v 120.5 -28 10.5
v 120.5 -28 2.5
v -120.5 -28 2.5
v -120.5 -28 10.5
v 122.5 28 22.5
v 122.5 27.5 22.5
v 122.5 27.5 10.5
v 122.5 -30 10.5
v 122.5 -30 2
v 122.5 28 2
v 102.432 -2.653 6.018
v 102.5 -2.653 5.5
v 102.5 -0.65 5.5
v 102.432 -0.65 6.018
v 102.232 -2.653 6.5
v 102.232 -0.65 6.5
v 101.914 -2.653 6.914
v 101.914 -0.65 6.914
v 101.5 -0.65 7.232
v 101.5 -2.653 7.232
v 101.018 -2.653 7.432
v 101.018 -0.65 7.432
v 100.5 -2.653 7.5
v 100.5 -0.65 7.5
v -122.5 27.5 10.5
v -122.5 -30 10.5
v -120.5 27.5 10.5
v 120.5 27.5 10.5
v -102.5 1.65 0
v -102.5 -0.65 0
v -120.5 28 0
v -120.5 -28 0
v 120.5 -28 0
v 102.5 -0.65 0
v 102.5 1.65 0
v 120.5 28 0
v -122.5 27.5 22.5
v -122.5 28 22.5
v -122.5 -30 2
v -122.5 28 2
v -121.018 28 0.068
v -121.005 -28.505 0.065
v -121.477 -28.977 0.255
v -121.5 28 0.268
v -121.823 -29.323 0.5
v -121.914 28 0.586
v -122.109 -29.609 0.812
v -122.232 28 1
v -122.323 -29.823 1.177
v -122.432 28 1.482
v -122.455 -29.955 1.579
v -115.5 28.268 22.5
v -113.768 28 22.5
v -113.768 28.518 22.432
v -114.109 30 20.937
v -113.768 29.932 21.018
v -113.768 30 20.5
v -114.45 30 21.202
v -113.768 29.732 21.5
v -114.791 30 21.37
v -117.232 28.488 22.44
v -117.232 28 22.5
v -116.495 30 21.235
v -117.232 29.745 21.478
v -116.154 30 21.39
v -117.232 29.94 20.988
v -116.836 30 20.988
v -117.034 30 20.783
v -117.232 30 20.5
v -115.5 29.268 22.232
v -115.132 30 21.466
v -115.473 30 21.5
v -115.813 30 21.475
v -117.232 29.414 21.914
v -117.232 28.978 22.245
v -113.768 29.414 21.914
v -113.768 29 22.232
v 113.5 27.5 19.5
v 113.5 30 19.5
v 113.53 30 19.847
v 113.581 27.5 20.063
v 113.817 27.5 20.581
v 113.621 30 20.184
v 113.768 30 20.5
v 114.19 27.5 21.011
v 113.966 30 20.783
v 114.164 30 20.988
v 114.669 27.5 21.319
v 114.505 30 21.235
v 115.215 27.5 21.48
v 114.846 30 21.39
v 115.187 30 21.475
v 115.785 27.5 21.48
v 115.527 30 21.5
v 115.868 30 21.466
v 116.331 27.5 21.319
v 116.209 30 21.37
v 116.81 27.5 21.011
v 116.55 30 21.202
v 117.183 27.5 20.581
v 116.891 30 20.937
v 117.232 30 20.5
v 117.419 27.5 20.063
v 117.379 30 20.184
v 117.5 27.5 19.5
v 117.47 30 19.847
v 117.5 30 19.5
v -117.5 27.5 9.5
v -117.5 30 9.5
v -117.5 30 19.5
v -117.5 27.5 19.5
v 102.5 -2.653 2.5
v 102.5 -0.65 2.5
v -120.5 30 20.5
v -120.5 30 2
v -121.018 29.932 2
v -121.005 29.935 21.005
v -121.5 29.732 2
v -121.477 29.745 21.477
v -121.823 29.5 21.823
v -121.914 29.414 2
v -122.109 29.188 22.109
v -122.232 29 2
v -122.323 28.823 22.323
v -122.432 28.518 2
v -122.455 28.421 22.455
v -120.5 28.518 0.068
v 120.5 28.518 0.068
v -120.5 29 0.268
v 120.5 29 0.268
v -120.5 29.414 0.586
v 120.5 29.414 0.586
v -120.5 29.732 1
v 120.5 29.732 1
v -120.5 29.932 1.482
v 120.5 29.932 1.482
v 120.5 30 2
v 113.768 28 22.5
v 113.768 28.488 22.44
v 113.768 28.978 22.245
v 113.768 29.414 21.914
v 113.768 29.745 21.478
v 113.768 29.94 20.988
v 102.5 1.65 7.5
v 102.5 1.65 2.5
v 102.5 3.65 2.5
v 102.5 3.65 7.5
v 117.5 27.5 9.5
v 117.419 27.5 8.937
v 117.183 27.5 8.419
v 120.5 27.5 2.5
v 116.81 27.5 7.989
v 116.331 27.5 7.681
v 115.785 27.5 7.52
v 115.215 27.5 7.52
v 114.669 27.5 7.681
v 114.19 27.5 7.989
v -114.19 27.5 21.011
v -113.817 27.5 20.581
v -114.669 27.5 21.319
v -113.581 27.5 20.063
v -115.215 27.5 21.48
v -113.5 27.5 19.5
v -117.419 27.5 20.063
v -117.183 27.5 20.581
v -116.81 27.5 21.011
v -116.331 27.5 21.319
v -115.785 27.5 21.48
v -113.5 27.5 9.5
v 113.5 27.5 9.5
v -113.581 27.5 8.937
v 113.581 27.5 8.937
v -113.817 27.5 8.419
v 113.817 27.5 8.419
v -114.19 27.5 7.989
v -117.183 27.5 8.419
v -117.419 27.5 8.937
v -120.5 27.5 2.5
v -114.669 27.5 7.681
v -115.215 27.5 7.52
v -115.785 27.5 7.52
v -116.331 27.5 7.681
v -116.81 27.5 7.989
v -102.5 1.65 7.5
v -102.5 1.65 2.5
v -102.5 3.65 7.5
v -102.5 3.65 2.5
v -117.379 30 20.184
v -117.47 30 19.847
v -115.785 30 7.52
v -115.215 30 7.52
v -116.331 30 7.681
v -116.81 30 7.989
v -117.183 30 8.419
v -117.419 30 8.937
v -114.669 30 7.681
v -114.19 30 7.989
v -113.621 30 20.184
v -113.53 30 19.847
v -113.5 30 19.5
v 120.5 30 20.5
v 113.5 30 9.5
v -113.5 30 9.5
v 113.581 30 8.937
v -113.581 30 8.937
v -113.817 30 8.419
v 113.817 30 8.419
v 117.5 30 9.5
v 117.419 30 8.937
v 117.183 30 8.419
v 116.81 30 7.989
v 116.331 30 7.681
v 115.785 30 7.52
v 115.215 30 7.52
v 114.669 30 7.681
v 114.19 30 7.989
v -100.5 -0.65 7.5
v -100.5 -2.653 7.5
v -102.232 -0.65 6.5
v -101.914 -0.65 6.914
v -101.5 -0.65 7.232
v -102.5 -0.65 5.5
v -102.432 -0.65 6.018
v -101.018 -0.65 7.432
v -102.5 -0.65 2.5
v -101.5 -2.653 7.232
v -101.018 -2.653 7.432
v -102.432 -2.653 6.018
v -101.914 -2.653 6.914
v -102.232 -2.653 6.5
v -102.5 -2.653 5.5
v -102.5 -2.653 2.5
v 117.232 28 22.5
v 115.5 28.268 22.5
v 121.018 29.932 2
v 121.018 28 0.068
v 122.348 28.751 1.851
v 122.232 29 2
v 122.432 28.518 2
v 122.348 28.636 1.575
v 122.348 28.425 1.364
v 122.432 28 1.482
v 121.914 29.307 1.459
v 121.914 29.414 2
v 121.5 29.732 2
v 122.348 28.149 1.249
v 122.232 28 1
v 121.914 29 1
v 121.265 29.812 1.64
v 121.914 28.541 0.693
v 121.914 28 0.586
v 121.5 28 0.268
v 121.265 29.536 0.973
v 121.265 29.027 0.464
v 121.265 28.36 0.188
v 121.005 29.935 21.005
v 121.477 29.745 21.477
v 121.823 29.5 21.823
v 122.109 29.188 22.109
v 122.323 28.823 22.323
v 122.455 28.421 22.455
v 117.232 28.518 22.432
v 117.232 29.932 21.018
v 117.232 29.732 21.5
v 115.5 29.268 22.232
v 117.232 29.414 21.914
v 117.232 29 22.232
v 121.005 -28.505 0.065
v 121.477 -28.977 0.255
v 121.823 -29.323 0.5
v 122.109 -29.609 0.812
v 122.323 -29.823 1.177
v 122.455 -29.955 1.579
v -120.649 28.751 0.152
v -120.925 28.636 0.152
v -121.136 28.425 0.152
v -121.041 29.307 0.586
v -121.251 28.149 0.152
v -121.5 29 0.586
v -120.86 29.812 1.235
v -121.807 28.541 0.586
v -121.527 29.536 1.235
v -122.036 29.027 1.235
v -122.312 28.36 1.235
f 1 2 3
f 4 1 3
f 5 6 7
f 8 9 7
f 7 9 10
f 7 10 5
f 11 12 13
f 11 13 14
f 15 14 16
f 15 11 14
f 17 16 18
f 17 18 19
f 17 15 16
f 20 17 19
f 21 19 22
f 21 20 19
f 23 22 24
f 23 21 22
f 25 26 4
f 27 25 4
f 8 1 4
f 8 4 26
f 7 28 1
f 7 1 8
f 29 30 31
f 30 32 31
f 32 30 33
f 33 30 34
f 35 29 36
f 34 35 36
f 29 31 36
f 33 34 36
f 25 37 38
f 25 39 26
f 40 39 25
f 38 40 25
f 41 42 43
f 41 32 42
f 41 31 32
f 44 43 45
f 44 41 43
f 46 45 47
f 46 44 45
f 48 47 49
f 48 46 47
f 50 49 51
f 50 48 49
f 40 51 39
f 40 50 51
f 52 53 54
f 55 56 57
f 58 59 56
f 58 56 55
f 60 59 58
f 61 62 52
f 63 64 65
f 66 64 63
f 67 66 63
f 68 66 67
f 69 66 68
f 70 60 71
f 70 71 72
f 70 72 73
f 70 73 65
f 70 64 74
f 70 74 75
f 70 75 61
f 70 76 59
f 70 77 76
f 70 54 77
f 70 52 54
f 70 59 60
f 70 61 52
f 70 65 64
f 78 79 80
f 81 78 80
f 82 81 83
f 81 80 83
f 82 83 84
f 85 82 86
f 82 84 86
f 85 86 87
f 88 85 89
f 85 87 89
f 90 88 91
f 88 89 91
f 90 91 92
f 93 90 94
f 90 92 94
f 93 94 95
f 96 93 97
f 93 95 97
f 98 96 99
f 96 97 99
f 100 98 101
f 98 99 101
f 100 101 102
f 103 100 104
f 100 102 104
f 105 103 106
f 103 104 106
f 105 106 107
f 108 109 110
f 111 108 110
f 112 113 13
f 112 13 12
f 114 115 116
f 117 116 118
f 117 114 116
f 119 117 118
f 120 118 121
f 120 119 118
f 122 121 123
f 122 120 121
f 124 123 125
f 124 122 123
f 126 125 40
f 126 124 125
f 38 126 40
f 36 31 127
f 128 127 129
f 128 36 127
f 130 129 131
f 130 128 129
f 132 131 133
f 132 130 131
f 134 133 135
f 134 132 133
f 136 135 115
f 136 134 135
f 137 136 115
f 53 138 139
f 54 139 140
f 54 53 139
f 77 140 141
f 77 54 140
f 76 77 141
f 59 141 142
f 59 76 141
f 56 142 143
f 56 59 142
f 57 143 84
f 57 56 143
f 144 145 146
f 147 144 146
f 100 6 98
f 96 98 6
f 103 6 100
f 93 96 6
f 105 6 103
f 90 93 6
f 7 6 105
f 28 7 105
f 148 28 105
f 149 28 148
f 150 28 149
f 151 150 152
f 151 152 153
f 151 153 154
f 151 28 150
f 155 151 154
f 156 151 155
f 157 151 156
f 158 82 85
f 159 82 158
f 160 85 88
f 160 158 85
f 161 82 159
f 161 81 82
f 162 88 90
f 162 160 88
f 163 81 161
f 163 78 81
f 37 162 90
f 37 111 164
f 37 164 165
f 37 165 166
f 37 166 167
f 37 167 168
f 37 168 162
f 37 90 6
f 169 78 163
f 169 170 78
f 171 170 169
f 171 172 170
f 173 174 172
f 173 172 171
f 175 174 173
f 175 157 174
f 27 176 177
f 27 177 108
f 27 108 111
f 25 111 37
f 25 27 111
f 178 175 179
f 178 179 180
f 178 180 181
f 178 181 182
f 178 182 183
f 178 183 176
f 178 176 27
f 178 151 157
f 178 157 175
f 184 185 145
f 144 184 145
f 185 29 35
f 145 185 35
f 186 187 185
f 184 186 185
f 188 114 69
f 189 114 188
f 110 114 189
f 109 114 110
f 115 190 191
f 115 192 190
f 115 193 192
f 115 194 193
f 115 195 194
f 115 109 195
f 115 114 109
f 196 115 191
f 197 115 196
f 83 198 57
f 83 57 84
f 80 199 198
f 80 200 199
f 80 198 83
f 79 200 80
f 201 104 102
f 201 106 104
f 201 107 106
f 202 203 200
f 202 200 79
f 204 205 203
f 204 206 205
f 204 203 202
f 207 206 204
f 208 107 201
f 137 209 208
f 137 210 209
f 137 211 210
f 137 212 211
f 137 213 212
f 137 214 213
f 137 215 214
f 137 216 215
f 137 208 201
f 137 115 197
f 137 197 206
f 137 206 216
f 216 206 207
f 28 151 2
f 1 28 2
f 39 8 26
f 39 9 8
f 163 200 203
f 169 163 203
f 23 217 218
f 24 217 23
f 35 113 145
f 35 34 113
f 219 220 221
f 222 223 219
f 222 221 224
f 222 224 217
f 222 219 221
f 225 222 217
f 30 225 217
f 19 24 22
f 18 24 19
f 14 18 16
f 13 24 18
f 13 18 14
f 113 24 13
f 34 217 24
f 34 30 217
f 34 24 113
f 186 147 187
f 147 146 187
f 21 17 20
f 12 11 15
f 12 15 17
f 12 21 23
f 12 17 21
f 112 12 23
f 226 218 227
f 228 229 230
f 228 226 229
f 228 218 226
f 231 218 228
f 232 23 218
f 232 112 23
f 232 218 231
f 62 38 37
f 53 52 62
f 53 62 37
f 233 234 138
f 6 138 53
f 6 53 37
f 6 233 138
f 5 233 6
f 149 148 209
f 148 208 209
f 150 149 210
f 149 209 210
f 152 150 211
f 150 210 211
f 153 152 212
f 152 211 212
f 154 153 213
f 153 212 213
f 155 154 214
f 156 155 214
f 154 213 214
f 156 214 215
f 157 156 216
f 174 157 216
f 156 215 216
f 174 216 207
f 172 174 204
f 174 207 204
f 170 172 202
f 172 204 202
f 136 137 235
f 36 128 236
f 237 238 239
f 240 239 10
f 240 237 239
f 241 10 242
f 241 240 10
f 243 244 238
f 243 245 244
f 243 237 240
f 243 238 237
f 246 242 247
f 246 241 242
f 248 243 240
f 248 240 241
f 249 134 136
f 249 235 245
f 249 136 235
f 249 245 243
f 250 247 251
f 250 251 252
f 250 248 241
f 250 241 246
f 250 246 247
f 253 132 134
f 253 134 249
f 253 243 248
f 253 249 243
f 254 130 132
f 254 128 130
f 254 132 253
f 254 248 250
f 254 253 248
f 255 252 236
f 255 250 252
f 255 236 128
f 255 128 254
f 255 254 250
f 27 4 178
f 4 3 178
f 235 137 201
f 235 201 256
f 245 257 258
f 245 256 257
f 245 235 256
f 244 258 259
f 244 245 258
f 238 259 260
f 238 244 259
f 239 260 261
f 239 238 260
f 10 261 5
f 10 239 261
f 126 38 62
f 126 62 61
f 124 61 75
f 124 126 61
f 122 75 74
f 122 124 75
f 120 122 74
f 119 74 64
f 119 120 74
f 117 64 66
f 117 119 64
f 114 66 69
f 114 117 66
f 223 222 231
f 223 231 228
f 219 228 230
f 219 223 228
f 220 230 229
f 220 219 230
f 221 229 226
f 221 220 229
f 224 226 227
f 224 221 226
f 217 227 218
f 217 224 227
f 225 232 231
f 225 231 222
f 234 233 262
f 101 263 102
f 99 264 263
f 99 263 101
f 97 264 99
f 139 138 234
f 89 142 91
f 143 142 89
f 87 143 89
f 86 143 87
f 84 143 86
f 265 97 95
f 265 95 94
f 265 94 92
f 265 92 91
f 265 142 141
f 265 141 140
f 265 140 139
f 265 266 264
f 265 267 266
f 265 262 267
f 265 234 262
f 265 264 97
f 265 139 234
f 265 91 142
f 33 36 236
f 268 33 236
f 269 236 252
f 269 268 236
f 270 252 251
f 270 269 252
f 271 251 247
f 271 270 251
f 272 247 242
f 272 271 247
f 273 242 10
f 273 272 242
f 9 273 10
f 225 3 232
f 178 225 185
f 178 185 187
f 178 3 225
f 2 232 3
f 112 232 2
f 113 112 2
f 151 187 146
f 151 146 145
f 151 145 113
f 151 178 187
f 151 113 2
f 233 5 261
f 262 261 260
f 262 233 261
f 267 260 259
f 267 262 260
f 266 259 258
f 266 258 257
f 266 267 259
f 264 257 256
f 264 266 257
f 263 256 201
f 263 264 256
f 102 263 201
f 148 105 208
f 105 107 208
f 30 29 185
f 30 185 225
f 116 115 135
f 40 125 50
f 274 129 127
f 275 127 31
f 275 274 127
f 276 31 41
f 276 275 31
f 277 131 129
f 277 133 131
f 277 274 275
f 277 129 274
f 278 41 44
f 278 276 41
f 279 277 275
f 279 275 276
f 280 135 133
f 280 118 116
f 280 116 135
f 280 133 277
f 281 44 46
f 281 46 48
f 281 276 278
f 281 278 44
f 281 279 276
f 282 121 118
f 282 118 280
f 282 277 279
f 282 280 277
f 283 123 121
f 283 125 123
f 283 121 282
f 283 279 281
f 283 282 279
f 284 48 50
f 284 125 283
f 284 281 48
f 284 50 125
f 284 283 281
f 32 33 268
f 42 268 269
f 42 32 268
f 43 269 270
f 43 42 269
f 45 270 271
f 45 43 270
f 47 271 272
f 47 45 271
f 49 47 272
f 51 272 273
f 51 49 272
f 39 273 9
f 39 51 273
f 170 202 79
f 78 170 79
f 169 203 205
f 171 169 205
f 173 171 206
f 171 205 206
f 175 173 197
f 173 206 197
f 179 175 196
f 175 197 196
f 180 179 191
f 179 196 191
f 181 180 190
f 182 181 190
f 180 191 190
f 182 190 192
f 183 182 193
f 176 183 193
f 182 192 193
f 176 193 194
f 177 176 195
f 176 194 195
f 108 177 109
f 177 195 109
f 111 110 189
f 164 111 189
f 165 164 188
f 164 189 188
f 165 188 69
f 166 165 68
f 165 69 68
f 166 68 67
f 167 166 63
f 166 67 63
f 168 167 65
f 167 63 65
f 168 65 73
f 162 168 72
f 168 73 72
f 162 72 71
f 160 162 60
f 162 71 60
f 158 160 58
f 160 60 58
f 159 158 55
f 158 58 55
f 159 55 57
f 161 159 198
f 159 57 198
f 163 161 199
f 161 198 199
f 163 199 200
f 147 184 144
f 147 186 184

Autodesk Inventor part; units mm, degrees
ref_plane "YZ Plane" through (0, 0, 0) normal (1, 0, 0) x (0, 1, 0)
ref_plane "XZ Plane" through (0, 0, 0) normal (0, 1, 0) x (-1, 0, 0)
ref_plane "XY Plane" through (0, 0, 0) normal (0, 0, 1) x (1, 0, 0)
sketch "Skizze2" plane through (0, 0, 0) normal (0, 0, 1) x (1, 0, 0)
  line L0 (-122.5, 30) -> (122.5, 30)
  line L1 (122.5, 30) -> (122.5, -30)
  line L2 (122.5, -30) -> (-122.5, -30)
  line L3 (-122.5, -30) -> (-122.5, 30)
  line L4 (-122.5, 30) -> (122.5, -30) construction
  line L5 (122.5, 30) -> (-122.5, -30) construction
  point P0 (0, 0)
  dimension "d0" = 245
  dimension "d1" = 60
extrude "Extrusion1" add sketch "Skizze2" along normal blind 2.5
sketch "Skizze3" plane through (0, 0, 2.5) normal (0, 0, 1) x (1, 0, 0)
  line L0 (122.5, 30) -> (-122.5, 30) construction
  line L1 (-122.5, 30) -> (-122.5, -30) construction
  line L2 (-122.5, -30) -> (122.5, -30) construction
  line L3 (122.5, -30) -> (122.5, 30) construction
  line L4 (122.5, 30) -> (-122.5, 30) projected
  line L5 (122.5, -30) -> (122.5, 30) projected
  line L6 (-122.5, 30) -> (122.5, 30)
  line L7 (122.5, 30) -> (122.5, 27.5)
  line L8 (122.5, 27.5) -> (-122.5, 27.5)
  line L9 (-122.5, 27.5) -> (-122.5, 30)
  point P0 (0, 0)
  dimension "d4" = 2.5
extrude "Extrusion2" add sketch "Skizze3" along normal blind 20
sketch "Skizze4" plane through (-122.5, 30, 0) normal (0, 1, 0) x (1, 0, 0)
  line L0 (0, 0) -> (245, 0) construction
  line L1 (0, 0) -> (0, -22.5) construction
  line L2 (245, -22.5) -> (0, -22.5) construction
  line L3 (245, 0) -> (245, -22.5) construction
  line L4 (122.5, 0) -> (7, 0) construction
  line L5 (0, 0) -> (245, 0) construction
  line L6 (7, 0) -> (238, 0) construction
  line L7 (7, -22.5) -> (7, -14.5) construction
  line L8 (245, -22.5) -> (0, -22.5) projected
  line L9 (238, -22.5) -> (238, -14.5) construction
  line L10 (7, -19.5) -> (7, -9.5) construction
  line L11 (9, -19.5) -> (9, -9.5)
  line L12 (5, -9.5) -> (5, -19.5)
  arc A0 (5, -19.5) -> (9, -19.5) centre (7, -19.5) ccw
  arc A1 (9, -9.5) -> (5, -9.5) centre (7, -9.5) ccw
  line L13 (238, -9.5) -> (238, -19.5) construction
  line L14 (236, -9.5) -> (236, -19.5)
  line L15 (240, -19.5) -> (240, -9.5)
  arc A2 (240, -9.5) -> (236, -9.5) centre (238, -9.5) ccw
  arc A3 (236, -19.5) -> (240, -19.5) centre (238, -19.5) ccw
  dimension "d8" = 231
  dimension "d9" = 8
  dimension "d10" = 5
  dimension "d11" = 4
  dimension "d12" = 8
  dimension "d13" = 5
  dimension "d14" = 4
extrude "Extrusion3" cut sketch "Skizze4" against normal blind 20
sketch "Skizze5" plane through (0, 0, 2.5) normal (0, 0, 1) x (1, 0, 0)
  line L0 (122.5, 27.5) -> (-122.5, 27.5) construction
  line L1 (-122.5, 27.5) -> (-122.5, -30) construction
  line L2 (-122.5, -30) -> (122.5, -30) construction
  line L3 (122.5, -30) -> (122.5, 27.5) construction
  line L4 (122.5, -30) -> (122.5, 27.5) projected
  line L5 (122.5, 27.5) -> (122.5, -30)
  line L6 (122.5, -30) -> (-122.5, -30)
  line L7 (-122.5, -30) -> (-122.5, 27.5)
  line L8 (-122.5, 24.8143) -> (-120.5, 24.8143) construction
  line L9 (122.5, 16.3856) -> (120.5, 16.3856) construction
  line L10 (-122.5, -30) -> (122.5, -30) projected
  line L11 (0, -30) -> (0, -28) construction
  line L12 (120.5, 27.5) -> (120.5, -28)
  line L13 (120.5, -28) -> (-120.5, -28)
  line L14 (-120.5, -28) -> (-120.5, 27.5)
  line L15 (-122.5, 27.5) -> (-120.5, 27.5)
  line L16 (120.5, 27.5) -> (122.5, 27.5)
  point P0 (0, 0)
  dimension "d17" = 2
  dimension "d18" = 2
  dimension "d19" = 2
extrude "Extrusion4" add sketch "Skizze5" along normal blind 8
fillet "Rundung1" radius 2 7 edges at (-122.5, 30, 11.25) (0, 30, 0) (122.5, 30, 11.25) (0, 30, 22.5) (122.5, 0, 0) (-122.5, 0, 0) (0, -30, 0)
sketch "Skizze7" plane through (0, 0, 0) normal (0, 0, -1) x (-1, 0, 0)
  line L0 (120.5, 30) -> (-120.5, 30) construction
  line L1 (122.5, -30) -> (122.5, 28) construction
  line L2 (-122.5, -30) -> (122.5, -30) construction
  line L3 (-122.5, 28) -> (-122.5, -30) construction
  line L4 (0, 30) -> (0, 0) construction
  line L5 (-102.5, 0.65) -> (102.5, 0.65)
  line L6 (102.5, 0.65) -> (102.5, -0.65)
  line L7 (102.5, -0.65) -> (-102.5, -0.65)
  line L8 (-102.5, -0.65) -> (-102.5, 0.65)
  line L9 (-102.5, 0.65) -> (102.5, -0.65) construction
  line L10 (102.5, 0.65) -> (-102.5, -0.65) construction
  dimension "d28" = 205
  dimension "d29" = 1.3
extrude "Extrusion6" cut sketch "Skizze7" against normal blind 5
sketch "Skizze8" plane through (0, 0, 2.5) normal (0, 0, 1) x (1, 0, 0)
  line L0 (102.5, -0.65) -> (-102.5, -0.65) construction
  line L1 (-102.5, -0.65) -> (102.5, -0.65)
  line L2 (102.5, -0.65) -> (102.5, -2.6532)
  line L3 (102.5, -2.6532) -> (-102.5, -2.6532)
  line L4 (-102.5, -2.6532) -> (-102.5, -0.65)
  point P0 (0, 0)
extrude "Extrusion7" add sketch "Skizze8" along normal blind 5
fillet "Rundung2" radius 2 2 edges at (-102.5, -1.6516, 7.5) (102.5, -1.6516, 7.5)
sketch "Skizze9" plane through (0, 0, 2.5) normal (0, 0, 1) x (1, 0, 0)
  line L0 (-102.5, 0.65) -> (102.5, 0.65) construction
  line L1 (100.5, -0.65) -> (-100.5, -0.65) construction
  line L2 (-102.5, 0.65) -> (102.5, 0.65)
  line L3 (102.5, 0.65) -> (102.5, 1.65)
  line L4 (102.5, 1.65) -> (-102.5, 1.65)
  line L5 (-102.5, 1.65) -> (-102.5, 0.65)
  point P0 (0, 0)
  dimension "d35" = 1
extrude "Extrusion8" cut sketch "Skizze9" against normal blind 10
sketch "Skizze10" plane through (0, 0, 2.5) normal (0, 0, 1) x (1, 0, 0)
  line L0 (-102.5, 1.65) -> (102.5, 1.65) projected
  line L1 (-102.5, 1.65) -> (102.5, 1.65)
  line L2 (102.5, 1.65) -> (102.5, 3.65)
  line L3 (102.5, 3.65) -> (-102.5, 3.65)
  line L4 (-102.5, 3.65) -> (-102.5, 1.65)
  point P0 (0, 0)
  dimension "d38" = 2
extrude "Extrusion9" add sketch "Skizze10" along normal blind 5
properties part number "Basket" material "Acetalharz, Schwarz"
